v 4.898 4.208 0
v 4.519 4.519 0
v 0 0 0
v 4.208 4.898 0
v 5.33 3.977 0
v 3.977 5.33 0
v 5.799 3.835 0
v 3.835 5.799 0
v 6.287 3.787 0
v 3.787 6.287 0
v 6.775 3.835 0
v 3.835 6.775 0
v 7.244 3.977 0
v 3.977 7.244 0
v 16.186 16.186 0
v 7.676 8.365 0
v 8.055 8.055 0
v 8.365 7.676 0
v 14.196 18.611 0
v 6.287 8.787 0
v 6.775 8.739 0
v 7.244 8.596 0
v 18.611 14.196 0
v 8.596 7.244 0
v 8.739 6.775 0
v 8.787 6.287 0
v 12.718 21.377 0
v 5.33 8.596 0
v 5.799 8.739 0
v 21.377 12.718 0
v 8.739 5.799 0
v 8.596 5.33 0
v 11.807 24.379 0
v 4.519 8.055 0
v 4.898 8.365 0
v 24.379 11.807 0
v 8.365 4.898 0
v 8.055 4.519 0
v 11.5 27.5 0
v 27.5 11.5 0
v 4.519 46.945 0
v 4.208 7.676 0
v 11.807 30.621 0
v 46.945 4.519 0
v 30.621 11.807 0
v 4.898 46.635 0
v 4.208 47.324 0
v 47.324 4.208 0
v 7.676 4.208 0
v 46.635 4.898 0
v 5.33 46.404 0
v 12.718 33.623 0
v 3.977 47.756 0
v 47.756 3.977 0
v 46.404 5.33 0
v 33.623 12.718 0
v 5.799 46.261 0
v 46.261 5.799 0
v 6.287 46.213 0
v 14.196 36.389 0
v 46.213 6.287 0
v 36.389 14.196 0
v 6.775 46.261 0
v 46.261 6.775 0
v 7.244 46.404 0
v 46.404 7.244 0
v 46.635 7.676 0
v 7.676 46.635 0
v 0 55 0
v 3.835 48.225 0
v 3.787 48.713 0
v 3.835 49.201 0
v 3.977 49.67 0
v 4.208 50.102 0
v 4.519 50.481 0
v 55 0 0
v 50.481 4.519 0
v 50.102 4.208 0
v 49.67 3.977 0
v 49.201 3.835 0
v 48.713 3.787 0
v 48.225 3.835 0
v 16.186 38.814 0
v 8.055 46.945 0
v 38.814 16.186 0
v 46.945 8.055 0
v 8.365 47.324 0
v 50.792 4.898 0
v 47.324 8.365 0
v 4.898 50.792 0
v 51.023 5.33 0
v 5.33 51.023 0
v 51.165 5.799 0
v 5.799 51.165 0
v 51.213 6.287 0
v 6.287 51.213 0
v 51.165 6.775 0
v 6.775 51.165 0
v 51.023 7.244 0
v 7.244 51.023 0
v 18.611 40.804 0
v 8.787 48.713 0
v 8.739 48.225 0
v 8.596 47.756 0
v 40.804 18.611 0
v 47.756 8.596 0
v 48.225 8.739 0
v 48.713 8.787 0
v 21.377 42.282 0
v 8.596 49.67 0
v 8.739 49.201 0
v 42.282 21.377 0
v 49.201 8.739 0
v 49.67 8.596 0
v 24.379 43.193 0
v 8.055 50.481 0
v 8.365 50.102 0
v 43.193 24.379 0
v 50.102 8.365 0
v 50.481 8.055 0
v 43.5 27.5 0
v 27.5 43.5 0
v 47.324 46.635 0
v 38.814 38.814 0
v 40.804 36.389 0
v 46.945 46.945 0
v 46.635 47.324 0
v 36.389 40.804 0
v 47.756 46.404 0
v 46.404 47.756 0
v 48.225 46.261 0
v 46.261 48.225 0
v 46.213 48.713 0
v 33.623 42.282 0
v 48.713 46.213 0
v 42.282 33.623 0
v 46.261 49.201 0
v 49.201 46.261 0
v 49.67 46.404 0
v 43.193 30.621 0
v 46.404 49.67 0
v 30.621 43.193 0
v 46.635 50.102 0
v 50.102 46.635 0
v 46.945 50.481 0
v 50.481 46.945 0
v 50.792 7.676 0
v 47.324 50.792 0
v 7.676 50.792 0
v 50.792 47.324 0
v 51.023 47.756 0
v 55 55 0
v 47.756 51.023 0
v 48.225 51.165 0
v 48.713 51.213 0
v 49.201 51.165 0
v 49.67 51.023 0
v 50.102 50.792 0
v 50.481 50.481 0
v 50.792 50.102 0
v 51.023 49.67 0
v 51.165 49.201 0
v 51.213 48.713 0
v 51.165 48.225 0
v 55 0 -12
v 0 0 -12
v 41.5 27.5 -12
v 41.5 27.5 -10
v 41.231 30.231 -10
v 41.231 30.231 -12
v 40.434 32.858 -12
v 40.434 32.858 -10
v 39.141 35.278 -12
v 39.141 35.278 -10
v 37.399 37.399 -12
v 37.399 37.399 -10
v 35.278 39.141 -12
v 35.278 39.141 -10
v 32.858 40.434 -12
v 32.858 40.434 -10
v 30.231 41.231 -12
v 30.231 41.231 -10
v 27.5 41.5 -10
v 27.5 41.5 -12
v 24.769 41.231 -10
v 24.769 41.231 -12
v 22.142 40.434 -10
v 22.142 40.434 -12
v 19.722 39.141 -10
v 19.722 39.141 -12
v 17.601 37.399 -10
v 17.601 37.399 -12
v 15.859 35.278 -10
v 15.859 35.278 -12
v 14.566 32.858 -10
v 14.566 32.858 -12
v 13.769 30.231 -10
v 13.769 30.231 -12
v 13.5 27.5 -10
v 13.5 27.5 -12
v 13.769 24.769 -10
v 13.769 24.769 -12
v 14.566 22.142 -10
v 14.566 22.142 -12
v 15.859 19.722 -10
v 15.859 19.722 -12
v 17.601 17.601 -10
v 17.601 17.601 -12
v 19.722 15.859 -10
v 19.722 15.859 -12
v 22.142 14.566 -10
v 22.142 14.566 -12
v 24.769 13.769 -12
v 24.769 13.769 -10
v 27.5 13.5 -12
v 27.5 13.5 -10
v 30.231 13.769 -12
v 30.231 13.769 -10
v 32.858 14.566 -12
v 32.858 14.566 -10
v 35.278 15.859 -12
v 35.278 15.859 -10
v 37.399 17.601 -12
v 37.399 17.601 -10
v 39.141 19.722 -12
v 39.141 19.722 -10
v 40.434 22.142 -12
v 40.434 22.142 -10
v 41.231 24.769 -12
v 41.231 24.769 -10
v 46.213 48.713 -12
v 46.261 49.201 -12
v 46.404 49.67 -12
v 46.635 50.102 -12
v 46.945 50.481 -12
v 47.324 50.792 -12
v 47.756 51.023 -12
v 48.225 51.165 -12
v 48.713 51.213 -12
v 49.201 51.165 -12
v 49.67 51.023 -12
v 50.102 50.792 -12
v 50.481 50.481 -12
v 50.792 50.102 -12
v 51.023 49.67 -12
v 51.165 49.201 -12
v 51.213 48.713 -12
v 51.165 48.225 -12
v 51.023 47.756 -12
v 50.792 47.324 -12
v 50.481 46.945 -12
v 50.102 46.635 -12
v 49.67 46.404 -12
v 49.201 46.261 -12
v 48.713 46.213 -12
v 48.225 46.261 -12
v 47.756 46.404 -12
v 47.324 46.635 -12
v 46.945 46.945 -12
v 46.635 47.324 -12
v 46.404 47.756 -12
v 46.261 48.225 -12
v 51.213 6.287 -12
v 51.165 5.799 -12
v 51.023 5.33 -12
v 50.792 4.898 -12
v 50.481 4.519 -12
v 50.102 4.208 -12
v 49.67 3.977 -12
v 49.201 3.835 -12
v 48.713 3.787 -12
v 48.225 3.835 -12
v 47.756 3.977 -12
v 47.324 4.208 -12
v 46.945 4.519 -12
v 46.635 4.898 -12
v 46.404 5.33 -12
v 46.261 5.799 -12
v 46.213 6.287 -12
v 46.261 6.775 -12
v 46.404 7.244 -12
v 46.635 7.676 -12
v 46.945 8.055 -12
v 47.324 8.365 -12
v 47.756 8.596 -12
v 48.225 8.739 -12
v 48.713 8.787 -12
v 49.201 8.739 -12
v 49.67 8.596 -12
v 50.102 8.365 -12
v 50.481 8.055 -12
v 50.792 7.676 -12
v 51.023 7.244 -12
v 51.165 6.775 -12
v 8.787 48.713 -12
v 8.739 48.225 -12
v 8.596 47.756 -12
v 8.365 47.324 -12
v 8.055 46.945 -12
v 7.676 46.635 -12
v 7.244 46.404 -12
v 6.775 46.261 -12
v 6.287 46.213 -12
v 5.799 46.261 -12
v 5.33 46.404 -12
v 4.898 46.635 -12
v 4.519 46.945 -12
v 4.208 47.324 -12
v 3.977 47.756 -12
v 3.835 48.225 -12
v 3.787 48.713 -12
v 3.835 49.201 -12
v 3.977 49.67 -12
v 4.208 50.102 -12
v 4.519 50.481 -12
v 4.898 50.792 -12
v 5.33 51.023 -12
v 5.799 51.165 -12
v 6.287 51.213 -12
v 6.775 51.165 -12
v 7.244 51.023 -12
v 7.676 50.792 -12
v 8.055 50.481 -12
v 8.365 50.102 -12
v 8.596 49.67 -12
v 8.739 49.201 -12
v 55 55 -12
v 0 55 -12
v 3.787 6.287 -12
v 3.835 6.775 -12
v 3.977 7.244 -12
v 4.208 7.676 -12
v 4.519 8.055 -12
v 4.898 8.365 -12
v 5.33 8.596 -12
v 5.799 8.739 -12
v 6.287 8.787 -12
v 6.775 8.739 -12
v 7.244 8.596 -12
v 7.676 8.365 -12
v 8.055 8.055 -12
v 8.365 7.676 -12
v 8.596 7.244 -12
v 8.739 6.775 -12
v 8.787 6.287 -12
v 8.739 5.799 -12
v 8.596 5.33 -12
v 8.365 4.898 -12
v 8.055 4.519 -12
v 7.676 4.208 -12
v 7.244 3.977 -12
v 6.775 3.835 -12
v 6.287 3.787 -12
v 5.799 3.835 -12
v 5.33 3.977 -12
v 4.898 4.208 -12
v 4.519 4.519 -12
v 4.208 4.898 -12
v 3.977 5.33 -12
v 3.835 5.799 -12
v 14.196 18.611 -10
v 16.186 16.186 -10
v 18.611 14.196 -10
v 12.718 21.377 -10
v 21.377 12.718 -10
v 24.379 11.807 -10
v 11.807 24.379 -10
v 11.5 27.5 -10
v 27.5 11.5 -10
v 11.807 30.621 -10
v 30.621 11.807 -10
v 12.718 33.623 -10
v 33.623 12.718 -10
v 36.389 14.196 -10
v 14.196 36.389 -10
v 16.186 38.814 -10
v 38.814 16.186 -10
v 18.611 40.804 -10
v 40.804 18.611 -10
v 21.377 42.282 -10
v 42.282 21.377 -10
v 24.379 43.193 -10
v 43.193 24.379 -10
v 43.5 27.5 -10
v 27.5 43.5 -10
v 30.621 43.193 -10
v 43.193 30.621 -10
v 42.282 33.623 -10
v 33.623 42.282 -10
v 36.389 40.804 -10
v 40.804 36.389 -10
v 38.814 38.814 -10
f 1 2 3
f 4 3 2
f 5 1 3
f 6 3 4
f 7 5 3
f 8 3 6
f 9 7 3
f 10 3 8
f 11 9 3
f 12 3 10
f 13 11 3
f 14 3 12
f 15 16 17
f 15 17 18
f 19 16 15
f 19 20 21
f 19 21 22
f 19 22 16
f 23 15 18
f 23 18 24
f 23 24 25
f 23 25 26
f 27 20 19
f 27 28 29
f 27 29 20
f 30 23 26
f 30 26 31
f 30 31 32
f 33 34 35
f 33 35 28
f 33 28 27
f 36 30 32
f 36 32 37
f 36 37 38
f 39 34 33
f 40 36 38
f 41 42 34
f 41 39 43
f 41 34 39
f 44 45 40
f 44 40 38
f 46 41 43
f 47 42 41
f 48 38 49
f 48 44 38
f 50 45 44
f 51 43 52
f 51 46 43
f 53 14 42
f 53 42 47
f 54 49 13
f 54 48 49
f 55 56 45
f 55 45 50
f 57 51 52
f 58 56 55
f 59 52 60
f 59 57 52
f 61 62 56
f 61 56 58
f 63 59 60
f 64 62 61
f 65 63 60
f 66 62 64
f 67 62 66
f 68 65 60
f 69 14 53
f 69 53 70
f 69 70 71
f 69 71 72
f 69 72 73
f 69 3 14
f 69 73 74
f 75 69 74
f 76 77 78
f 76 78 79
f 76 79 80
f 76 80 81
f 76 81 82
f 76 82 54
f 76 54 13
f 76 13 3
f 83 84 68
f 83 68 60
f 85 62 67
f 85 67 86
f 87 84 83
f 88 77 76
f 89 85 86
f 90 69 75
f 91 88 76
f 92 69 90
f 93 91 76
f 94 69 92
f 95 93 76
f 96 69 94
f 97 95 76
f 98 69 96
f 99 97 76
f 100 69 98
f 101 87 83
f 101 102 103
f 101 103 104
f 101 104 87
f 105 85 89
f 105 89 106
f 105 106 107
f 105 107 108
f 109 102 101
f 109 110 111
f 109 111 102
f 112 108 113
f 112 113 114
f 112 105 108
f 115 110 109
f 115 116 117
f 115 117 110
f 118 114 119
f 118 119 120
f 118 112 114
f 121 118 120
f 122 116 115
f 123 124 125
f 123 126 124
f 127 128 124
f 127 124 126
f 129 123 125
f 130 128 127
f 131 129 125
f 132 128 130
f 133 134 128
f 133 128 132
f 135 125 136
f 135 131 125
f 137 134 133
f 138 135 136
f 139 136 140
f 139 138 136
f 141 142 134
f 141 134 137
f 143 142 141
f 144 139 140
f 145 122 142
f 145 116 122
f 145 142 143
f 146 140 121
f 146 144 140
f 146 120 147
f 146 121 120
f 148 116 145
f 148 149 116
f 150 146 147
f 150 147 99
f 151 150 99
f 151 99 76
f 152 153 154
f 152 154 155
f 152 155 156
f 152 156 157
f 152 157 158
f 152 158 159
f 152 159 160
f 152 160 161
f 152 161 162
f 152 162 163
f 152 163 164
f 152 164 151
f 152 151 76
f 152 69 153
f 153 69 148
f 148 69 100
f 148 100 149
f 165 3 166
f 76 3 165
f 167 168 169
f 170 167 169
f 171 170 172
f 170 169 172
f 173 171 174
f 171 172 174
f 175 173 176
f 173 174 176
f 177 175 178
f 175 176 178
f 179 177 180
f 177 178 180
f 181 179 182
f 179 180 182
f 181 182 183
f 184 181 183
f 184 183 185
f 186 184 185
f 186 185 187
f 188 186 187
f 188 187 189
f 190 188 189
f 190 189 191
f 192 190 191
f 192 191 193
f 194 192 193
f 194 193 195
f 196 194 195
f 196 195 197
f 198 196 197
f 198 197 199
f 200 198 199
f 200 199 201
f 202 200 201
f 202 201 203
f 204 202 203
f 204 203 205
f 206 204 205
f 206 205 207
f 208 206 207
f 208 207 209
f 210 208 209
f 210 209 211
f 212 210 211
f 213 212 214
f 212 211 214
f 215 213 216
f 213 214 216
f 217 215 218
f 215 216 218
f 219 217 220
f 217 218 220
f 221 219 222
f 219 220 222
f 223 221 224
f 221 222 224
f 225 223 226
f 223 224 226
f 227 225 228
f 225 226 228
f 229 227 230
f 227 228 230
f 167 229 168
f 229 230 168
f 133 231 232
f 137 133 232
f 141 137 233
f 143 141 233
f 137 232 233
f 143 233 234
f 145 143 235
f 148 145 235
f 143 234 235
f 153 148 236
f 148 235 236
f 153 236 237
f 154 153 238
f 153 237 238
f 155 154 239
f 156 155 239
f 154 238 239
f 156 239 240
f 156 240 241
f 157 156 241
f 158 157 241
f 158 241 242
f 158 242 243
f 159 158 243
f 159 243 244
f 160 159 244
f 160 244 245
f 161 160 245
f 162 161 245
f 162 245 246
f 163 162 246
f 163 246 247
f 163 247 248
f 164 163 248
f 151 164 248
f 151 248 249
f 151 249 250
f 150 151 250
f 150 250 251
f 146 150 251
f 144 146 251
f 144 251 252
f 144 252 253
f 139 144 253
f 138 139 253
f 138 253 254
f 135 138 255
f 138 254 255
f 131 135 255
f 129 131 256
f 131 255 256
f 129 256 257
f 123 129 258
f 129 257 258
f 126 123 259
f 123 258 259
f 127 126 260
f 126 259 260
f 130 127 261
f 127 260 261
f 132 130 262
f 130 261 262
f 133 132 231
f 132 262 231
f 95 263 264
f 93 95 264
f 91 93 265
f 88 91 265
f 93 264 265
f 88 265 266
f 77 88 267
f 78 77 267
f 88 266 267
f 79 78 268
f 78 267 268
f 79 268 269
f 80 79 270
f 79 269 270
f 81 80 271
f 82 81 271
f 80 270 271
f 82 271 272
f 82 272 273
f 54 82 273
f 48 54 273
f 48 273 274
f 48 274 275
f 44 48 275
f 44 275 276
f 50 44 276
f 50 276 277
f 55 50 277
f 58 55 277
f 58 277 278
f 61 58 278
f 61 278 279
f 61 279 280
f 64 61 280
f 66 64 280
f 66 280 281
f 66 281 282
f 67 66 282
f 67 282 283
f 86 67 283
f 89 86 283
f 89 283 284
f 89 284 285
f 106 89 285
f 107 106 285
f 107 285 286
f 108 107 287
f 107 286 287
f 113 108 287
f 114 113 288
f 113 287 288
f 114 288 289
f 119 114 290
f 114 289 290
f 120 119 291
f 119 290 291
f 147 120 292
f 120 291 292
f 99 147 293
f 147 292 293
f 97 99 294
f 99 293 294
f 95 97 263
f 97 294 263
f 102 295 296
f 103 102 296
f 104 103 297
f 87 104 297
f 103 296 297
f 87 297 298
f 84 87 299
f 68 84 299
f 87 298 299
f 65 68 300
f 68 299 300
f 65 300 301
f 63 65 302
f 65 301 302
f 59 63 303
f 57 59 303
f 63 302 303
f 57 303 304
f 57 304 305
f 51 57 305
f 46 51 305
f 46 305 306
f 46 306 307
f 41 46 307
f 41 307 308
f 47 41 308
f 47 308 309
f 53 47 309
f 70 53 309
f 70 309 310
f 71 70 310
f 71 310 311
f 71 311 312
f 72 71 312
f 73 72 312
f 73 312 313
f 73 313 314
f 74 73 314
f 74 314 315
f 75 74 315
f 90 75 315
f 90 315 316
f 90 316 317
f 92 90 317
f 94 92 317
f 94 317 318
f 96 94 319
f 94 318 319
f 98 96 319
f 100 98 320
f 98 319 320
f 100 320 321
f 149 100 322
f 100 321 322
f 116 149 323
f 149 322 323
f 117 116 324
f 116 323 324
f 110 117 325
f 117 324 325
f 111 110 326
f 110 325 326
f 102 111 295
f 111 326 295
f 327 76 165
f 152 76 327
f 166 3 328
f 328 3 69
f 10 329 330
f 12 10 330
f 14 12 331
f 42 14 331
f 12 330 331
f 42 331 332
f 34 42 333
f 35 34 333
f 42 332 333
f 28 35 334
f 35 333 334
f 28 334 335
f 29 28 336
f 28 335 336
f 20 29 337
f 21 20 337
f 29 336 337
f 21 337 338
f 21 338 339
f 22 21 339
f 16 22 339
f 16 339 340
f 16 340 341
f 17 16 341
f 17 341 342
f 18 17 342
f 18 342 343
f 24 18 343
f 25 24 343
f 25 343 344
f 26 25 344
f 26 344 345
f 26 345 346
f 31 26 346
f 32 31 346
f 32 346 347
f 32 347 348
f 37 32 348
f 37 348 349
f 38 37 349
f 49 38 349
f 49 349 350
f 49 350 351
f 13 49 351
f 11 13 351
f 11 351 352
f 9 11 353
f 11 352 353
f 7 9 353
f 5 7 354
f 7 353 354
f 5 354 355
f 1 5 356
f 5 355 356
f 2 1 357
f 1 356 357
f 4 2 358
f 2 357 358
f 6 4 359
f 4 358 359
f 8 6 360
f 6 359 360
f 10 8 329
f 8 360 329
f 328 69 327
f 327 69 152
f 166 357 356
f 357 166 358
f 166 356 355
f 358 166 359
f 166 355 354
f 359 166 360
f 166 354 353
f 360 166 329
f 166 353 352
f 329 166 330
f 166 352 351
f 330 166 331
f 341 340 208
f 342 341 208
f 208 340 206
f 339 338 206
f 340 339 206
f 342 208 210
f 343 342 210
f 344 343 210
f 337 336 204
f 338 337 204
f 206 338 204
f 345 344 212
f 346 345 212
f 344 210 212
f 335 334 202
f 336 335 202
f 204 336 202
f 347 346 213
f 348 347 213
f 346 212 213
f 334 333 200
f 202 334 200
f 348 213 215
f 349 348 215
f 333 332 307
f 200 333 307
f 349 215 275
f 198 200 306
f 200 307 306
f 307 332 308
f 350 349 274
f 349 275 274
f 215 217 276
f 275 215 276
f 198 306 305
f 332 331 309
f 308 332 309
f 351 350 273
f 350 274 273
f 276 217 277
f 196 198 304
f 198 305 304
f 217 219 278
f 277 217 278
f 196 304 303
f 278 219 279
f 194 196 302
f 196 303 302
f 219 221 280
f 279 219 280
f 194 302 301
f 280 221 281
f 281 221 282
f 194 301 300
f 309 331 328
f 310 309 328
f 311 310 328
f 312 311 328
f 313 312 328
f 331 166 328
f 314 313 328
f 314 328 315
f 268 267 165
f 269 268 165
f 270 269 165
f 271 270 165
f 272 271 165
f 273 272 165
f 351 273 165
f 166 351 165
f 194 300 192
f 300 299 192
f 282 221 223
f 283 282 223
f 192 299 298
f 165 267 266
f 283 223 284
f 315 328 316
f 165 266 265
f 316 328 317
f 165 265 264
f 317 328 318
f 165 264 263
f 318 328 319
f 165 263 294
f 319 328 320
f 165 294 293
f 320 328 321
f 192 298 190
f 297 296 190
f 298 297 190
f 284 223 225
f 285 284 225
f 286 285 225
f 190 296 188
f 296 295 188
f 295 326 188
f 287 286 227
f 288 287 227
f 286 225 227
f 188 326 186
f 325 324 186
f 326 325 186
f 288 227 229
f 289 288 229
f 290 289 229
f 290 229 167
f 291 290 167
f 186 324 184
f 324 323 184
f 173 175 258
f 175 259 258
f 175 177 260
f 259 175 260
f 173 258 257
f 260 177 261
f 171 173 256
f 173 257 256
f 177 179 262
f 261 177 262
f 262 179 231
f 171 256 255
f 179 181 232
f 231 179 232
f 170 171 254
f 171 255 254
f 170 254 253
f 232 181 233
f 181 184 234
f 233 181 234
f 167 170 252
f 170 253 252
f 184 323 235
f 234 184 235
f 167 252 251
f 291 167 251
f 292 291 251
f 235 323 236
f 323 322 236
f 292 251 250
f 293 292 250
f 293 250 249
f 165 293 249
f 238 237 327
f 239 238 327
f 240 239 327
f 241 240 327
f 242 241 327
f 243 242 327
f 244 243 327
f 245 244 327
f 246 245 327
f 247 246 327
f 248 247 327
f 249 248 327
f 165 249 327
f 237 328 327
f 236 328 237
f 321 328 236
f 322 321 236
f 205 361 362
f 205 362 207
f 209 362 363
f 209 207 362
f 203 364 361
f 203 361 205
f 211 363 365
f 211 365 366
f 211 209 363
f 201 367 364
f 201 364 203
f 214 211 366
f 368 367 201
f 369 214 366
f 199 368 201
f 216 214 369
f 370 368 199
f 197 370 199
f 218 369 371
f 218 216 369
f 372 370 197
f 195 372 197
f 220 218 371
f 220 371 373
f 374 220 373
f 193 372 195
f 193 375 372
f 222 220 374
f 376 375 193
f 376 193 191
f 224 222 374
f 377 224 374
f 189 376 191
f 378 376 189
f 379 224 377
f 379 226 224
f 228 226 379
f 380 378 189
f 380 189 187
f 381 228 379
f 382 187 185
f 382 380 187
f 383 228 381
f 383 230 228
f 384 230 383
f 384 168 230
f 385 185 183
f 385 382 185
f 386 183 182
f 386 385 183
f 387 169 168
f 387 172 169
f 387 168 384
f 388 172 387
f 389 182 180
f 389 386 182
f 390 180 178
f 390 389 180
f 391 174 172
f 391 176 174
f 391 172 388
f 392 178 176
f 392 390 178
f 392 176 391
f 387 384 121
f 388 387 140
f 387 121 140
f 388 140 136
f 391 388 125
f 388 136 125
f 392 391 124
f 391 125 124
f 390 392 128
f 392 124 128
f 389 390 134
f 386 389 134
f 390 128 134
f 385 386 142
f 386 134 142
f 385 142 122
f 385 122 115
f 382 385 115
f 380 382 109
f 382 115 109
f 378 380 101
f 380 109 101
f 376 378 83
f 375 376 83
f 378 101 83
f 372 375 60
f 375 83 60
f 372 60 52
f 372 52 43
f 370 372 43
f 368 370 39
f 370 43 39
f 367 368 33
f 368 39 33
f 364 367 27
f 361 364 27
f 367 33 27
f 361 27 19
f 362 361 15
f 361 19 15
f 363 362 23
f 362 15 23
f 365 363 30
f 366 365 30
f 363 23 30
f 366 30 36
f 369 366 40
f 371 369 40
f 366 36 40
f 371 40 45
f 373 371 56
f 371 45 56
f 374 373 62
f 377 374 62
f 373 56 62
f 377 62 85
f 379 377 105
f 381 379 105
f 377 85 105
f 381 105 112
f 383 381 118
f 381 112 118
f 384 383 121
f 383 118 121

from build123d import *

# Parameters (mm, degrees)
SCHIZZO1_W                   = 55
SCHIZZO1_H                   = 55
ESTRUSIONE_ESTRUSIONE1_DEPTH = 12
SCHIZZO2_R                   = 16
TAGLIO_ESTRUSIONE1_DEPTH     = 10
SCHIZZO3_R                   = 14
TAGLIO_ESTRUSIONE2_DEPTH     = 10
SCHIZZO4_R                   = 2.5
TAGLIO_ESTRUSIONE3_DEPTH     = 79.70196948


with BuildPart() as part:
    # Schizzo1 → Estrusione-Estrusione1 (new body)
    with BuildSketch(Plane.XY):
        with Locations((27.5, 27.5)):
            Rectangle(SCHIZZO1_W, SCHIZZO1_H)
    extrude(amount=-ESTRUSIONE_ESTRUSIONE1_DEPTH)

    # Schizzo2 → Taglio-Estrusione1 (cut)
    with BuildSketch(Plane.XY):
        with Locations((27.5, 27.5)):
            Circle(SCHIZZO2_R)
    extrude(amount=-TAGLIO_ESTRUSIONE1_DEPTH, mode=Mode.SUBTRACT)

    # Schizzo3 → Taglio-Estrusione2 (cut)
    with BuildSketch(Plane.XY.offset(-10)):
        with Locations((27.5, 27.5)):
            Circle(SCHIZZO3_R)
    extrude(amount=-TAGLIO_ESTRUSIONE2_DEPTH, mode=Mode.SUBTRACT)

    # Schizzo4 → Taglio-Estrusione3 (cut, through all)
    with BuildSketch(Plane(origin=(0, 0, -12), x_dir=(-1, 0, 0), z_dir=(0, 0, -1))):
        with Locations((-48.713203436, 48.713203436)):
            Circle(SCHIZZO4_R)
        with Locations(Location((-6.286796564, 48.713203436, 0), (0, 0, 180))):
            Circle(SCHIZZO4_R)
        with Locations(Location((-48.713203436, 6.286796564, 0), (0, 0, 180))):
            Circle(SCHIZZO4_R)
        with Locations((-6.286796564, 6.286796564)):
            Circle(SCHIZZO4_R)
    extrude(amount=-TAGLIO_ESTRUSIONE3_DEPTH, mode=Mode.SUBTRACT)


solid = part.part
